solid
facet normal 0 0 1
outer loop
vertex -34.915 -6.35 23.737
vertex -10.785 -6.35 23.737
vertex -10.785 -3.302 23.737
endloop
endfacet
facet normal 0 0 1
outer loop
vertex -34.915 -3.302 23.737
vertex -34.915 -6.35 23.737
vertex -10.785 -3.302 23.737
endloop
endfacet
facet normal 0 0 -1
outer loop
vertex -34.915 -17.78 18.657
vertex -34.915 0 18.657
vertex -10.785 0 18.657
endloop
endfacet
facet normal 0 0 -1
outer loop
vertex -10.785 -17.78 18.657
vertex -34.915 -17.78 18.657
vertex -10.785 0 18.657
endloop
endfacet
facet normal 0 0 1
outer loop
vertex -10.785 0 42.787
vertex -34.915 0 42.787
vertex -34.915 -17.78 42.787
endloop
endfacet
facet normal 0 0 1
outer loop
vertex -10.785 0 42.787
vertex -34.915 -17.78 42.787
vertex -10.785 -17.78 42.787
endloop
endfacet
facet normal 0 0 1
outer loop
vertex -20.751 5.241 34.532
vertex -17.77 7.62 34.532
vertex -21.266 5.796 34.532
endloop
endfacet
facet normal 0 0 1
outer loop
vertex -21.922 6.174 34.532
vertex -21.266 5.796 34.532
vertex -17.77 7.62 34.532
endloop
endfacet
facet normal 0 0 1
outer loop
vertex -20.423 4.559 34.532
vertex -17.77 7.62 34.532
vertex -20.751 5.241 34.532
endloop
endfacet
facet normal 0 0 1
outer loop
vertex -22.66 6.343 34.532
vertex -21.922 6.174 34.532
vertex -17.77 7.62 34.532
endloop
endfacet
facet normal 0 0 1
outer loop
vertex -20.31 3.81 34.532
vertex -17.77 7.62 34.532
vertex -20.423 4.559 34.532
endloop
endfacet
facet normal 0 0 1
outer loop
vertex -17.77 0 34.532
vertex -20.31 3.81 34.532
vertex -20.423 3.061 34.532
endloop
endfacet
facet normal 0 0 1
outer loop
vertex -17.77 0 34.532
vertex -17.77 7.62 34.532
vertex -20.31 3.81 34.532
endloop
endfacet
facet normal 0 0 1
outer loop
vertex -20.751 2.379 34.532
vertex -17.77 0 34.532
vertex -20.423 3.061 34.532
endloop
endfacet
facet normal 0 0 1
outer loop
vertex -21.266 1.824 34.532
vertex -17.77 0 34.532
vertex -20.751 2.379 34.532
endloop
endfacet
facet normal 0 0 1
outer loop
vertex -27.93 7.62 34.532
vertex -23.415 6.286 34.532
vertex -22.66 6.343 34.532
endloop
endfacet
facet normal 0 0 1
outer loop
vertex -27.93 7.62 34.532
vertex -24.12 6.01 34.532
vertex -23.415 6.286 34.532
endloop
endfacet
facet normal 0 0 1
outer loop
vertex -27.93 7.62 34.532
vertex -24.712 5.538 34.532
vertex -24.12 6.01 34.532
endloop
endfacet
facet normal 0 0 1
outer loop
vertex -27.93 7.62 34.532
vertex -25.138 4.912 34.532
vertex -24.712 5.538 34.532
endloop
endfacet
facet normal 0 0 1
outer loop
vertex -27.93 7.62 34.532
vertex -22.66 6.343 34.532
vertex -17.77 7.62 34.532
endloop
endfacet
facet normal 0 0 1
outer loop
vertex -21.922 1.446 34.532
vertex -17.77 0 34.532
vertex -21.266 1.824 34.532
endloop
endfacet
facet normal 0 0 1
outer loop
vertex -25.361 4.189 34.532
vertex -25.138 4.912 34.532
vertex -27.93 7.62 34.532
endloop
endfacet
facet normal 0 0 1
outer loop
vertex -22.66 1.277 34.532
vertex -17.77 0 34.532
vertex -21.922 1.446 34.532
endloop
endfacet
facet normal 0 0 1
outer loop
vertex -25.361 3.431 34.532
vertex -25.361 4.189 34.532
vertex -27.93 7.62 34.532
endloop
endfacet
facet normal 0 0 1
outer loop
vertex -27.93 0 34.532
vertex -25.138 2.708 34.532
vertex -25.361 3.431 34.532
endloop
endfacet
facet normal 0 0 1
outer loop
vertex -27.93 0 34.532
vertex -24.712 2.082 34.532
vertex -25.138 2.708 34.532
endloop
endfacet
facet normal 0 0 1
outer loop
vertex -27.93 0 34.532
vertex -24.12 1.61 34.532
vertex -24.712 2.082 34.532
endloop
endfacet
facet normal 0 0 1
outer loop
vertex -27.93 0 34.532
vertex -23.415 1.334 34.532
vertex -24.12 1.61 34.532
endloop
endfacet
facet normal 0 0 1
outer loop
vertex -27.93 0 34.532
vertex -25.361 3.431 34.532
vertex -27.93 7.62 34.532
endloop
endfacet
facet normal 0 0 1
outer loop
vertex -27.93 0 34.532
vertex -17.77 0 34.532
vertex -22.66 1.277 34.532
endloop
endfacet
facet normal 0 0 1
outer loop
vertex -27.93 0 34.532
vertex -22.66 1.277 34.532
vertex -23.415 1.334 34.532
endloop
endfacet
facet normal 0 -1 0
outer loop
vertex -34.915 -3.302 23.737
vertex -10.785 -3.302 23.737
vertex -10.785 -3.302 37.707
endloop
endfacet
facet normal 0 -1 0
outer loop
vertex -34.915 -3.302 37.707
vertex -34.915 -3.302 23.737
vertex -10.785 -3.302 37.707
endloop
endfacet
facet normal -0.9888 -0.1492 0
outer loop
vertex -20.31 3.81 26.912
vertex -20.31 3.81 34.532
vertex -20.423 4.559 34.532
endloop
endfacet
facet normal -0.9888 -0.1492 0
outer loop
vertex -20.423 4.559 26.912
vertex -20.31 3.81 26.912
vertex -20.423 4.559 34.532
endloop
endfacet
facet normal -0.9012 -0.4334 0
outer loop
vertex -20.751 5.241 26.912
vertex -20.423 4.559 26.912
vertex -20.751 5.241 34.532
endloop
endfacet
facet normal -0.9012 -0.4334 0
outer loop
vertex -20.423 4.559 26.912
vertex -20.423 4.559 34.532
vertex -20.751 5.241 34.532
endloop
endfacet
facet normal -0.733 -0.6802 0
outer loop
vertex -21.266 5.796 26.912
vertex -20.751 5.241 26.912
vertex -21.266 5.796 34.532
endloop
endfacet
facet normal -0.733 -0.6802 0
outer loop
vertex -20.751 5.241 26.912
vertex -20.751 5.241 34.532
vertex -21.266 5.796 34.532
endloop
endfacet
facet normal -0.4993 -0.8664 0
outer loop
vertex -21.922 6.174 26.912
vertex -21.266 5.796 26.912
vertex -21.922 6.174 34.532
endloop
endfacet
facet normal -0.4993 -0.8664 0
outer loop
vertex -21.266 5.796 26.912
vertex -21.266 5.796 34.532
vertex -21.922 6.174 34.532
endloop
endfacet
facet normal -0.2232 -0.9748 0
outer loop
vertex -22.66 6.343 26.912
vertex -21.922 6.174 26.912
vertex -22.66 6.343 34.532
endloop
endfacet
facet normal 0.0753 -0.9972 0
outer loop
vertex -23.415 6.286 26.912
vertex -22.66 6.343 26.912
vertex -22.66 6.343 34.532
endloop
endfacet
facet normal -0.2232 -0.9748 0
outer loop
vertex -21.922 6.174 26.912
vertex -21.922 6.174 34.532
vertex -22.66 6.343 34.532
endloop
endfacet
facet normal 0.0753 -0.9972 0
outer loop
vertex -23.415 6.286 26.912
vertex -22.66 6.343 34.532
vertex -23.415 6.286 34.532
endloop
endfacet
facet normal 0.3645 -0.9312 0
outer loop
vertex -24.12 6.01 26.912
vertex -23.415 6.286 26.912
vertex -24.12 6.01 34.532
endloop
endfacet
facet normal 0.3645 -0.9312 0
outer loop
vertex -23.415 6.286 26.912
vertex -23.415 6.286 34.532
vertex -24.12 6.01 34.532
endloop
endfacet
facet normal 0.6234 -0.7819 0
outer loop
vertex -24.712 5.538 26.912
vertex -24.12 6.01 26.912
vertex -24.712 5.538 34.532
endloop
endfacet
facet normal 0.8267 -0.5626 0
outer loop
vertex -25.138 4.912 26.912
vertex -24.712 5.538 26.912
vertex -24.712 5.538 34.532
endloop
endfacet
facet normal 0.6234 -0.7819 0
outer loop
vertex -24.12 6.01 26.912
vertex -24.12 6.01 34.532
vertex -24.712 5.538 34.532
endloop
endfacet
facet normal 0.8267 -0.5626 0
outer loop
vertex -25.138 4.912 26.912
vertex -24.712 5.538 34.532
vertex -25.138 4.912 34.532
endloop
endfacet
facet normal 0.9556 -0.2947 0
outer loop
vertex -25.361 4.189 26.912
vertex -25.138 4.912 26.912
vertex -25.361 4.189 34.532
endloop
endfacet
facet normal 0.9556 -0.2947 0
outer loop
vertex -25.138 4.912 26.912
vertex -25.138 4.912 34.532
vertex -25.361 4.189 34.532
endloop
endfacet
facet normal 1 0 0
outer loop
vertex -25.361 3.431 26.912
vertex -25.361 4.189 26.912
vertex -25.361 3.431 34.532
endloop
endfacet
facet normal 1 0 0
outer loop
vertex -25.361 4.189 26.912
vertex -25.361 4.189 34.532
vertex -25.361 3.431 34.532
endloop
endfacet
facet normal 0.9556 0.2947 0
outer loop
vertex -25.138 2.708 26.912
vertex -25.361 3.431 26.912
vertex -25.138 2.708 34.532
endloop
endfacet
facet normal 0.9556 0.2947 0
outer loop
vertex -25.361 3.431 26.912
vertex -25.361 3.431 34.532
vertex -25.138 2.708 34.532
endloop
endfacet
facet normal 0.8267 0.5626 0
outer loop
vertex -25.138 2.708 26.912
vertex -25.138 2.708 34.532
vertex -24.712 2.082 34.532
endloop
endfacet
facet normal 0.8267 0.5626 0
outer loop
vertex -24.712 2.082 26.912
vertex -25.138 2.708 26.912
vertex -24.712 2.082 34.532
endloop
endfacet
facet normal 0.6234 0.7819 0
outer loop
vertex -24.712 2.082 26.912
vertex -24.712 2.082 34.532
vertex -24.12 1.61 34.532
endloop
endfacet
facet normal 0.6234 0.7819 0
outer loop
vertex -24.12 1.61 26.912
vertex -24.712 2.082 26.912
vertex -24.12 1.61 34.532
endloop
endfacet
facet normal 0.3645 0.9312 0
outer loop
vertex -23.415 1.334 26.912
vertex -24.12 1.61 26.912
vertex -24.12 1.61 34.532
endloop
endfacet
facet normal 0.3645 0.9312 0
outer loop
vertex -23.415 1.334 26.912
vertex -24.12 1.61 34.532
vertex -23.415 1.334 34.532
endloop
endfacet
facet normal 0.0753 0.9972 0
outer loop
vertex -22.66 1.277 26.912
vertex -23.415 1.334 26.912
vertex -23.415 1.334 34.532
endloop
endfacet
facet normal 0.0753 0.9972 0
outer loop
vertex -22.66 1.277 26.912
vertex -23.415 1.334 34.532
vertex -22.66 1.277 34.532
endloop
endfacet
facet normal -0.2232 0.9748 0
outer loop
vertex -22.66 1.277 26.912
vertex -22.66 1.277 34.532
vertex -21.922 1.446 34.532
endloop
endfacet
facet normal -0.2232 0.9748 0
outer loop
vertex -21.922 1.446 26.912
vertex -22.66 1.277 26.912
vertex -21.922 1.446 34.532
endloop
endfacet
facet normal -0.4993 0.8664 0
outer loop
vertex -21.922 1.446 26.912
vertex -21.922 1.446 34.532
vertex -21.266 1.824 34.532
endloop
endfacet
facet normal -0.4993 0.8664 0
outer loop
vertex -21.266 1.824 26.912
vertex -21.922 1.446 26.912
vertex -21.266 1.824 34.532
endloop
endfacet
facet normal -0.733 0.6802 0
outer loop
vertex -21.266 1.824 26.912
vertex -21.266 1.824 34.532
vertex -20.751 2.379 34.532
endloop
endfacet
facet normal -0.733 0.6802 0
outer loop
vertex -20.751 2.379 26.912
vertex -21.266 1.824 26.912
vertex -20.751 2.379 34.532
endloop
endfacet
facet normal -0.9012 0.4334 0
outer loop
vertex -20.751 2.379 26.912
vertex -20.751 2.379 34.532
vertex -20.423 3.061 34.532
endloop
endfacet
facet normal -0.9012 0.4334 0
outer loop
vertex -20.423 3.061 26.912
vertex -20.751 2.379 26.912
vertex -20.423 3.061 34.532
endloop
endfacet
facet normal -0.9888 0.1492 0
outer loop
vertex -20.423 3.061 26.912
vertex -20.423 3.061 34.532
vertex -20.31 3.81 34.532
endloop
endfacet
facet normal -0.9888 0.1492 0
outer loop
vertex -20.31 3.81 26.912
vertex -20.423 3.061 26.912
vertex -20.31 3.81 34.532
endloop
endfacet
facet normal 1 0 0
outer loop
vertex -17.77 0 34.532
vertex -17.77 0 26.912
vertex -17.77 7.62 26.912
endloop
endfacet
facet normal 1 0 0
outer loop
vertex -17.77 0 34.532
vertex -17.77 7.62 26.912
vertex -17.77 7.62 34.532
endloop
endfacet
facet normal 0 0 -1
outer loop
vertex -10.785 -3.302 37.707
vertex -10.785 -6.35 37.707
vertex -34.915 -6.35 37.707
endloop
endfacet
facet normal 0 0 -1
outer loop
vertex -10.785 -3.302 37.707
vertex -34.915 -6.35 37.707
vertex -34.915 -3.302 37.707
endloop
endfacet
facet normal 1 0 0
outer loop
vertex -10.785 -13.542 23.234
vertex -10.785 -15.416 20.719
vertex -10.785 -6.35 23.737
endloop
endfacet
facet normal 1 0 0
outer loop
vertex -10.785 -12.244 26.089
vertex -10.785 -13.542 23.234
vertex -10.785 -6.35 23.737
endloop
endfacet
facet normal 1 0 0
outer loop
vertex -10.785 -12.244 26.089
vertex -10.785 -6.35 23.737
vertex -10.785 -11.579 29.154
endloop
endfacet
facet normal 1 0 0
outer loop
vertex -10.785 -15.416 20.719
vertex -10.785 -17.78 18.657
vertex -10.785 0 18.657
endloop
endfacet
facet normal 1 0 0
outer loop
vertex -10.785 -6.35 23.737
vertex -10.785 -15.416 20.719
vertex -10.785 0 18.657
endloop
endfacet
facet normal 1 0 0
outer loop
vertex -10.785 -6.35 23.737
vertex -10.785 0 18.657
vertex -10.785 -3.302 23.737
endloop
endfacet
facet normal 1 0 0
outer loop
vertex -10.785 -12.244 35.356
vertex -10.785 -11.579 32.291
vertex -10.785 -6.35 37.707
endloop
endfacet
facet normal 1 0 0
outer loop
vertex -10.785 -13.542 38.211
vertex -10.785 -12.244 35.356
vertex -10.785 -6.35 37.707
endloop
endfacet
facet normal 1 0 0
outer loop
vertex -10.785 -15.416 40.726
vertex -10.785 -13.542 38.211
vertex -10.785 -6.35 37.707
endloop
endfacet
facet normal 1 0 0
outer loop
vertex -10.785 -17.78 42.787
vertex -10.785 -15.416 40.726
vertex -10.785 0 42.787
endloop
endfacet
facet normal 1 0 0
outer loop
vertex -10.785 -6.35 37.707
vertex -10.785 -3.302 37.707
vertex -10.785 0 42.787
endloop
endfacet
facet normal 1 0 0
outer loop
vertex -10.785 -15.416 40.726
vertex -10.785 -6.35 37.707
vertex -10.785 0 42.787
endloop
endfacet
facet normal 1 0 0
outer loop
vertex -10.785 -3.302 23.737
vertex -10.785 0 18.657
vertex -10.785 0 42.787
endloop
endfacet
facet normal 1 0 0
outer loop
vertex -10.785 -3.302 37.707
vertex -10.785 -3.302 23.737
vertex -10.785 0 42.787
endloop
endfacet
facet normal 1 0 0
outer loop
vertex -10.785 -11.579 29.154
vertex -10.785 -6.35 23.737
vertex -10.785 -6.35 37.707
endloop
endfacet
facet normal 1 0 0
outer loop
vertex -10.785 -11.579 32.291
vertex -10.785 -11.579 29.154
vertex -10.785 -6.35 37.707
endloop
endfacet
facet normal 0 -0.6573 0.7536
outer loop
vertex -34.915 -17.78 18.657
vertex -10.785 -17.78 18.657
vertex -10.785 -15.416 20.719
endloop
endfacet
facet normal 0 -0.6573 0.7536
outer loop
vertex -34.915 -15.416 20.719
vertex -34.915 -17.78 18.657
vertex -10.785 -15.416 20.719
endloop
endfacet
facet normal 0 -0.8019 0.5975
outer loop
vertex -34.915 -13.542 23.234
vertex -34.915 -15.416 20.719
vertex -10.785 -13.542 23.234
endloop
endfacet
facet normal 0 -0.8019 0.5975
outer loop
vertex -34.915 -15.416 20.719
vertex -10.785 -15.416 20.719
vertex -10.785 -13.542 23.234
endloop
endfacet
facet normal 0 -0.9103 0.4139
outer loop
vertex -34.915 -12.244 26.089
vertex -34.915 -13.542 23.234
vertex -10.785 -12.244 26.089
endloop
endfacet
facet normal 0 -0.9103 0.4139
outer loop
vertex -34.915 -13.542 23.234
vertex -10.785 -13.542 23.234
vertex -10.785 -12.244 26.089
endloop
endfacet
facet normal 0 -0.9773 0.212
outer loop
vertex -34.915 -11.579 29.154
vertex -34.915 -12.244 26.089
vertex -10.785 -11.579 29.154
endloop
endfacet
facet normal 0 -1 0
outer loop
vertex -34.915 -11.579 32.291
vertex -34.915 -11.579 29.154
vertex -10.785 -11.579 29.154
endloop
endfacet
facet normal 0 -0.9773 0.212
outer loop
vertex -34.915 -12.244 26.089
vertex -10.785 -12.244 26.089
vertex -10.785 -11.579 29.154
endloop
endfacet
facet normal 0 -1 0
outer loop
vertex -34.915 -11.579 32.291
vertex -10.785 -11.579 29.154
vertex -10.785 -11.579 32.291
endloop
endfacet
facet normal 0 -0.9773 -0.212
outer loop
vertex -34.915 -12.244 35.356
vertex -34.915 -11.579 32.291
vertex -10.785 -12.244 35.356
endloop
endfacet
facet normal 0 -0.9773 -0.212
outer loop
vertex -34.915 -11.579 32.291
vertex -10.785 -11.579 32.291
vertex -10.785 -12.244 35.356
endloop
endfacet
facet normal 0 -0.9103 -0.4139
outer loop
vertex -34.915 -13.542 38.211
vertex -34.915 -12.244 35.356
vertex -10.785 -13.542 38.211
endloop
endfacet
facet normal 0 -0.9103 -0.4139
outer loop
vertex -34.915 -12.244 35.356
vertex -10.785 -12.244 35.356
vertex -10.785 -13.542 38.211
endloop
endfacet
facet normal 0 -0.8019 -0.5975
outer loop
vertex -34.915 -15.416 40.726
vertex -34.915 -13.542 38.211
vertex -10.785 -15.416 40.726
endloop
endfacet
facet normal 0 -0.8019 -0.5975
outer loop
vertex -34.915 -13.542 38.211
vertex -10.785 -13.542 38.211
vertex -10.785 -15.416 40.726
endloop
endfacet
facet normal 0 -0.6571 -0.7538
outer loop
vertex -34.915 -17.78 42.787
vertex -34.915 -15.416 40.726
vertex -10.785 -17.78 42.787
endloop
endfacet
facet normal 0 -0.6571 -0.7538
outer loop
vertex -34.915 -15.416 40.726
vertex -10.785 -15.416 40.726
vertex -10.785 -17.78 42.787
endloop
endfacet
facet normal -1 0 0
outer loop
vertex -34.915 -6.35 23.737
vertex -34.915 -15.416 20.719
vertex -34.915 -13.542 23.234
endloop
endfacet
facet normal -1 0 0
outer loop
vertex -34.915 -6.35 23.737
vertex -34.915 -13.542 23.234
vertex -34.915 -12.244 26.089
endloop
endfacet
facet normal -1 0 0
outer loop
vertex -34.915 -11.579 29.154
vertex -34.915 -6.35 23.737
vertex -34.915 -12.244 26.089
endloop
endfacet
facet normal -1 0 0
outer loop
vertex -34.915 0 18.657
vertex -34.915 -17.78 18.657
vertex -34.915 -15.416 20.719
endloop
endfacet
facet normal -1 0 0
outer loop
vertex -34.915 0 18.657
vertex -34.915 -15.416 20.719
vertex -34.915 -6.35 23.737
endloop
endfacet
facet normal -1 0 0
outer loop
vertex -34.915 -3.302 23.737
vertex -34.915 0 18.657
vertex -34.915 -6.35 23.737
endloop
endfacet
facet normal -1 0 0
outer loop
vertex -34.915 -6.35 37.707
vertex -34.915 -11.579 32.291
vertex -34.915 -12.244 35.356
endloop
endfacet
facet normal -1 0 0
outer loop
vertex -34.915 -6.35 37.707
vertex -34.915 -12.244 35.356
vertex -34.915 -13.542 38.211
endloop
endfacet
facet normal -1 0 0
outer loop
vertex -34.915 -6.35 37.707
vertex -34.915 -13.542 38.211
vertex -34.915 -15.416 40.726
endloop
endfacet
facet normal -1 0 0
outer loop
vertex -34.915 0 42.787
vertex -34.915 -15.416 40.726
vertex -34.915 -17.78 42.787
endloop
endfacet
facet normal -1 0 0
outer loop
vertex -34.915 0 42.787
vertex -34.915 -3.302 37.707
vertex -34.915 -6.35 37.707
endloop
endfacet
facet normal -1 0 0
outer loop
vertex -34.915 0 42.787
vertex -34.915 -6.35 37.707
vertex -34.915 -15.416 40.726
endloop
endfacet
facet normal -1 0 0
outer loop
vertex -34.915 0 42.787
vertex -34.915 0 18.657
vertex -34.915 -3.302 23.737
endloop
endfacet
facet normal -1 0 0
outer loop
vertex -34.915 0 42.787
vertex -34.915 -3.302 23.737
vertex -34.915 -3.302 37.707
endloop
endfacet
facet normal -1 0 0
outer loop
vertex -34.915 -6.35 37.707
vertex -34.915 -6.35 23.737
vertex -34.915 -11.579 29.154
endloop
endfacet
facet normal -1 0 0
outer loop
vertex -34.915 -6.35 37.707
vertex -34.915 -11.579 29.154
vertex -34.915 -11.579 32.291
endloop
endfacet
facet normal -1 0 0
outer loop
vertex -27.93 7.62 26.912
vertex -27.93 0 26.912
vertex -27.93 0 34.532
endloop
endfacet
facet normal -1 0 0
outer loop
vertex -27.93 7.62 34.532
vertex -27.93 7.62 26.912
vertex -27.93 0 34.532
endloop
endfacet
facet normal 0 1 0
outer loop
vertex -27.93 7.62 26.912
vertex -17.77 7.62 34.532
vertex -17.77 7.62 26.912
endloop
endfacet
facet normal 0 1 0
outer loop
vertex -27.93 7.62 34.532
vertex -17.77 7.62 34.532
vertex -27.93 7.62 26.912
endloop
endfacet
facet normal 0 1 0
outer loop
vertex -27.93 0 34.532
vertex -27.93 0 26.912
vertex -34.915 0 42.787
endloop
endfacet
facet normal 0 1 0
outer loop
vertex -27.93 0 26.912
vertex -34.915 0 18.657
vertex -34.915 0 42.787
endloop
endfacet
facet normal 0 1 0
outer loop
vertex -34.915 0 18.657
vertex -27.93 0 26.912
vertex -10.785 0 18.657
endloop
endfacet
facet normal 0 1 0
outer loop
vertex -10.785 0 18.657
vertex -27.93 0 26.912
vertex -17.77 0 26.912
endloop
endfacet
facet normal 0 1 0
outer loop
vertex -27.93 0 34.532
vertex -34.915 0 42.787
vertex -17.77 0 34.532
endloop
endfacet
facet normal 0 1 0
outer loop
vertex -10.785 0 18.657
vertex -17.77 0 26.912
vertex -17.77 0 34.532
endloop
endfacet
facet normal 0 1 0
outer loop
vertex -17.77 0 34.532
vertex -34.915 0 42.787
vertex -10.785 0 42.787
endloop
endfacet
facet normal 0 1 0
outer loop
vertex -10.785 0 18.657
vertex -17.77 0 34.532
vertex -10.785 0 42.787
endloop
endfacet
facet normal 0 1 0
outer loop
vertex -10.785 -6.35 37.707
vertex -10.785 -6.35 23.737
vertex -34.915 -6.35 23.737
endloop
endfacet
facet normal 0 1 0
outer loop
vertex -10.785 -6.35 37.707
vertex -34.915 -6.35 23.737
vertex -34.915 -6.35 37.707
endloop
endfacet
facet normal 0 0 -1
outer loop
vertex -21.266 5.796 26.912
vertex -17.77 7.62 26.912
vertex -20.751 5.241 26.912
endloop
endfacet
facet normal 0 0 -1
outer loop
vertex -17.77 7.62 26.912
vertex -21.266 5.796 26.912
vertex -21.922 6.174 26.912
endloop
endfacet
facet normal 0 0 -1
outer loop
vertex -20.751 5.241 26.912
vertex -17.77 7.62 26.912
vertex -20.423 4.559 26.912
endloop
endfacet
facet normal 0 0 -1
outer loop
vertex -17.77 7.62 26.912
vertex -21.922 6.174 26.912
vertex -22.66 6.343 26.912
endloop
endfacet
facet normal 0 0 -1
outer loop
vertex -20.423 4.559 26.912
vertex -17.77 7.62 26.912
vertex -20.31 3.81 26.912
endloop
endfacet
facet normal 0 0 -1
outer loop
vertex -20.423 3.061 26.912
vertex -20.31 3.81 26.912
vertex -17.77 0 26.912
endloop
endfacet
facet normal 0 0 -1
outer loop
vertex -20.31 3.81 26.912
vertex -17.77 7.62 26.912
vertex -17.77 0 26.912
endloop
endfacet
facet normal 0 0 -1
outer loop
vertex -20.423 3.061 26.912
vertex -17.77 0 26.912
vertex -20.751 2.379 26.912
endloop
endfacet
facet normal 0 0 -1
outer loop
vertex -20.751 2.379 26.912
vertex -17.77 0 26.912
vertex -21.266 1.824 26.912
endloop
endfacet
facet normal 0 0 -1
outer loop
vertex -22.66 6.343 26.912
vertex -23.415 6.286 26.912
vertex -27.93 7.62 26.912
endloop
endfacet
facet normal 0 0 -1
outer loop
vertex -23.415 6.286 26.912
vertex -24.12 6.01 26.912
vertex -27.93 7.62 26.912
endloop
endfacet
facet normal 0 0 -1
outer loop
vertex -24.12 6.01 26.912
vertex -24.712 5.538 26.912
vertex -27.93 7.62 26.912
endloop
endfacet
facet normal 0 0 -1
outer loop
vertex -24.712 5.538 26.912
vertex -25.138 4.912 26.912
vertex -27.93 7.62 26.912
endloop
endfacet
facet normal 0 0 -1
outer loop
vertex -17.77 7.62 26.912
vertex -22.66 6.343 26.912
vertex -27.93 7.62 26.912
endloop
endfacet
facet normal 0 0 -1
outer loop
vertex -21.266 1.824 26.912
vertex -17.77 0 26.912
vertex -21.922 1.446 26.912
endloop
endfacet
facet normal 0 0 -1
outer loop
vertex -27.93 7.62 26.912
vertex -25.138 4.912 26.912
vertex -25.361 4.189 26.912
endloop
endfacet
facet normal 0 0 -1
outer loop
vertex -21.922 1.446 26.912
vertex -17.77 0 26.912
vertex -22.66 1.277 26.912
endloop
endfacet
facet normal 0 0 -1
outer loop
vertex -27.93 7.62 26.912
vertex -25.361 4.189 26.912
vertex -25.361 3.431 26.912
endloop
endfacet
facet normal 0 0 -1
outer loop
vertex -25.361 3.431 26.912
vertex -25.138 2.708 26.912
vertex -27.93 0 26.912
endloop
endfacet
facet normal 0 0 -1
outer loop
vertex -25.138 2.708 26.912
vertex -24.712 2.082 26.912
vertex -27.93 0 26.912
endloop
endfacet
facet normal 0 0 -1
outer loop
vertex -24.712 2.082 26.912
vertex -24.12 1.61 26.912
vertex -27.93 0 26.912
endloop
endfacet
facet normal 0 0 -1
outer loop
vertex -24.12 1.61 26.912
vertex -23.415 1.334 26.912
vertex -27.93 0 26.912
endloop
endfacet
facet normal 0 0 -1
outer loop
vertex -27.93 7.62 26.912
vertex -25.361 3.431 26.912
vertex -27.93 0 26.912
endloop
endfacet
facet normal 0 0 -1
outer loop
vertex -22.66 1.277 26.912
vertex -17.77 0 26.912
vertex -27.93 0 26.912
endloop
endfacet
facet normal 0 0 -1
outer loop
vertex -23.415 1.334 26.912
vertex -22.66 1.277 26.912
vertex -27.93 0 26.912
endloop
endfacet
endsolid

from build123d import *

# Parameters (mm, degrees)
F0_W     = 24.13
F0_H     = 24.13
F1_DEPTH = 17.78
F3_DEPTH = 24.131
F4_W     = 10.16
F4_H     = 7.62
F5_DEPTH = 7.62
F6_R     = 2.54
F7_DEPTH = 15.876
F8_W     = 3.048
F8_H     = 13.97
F9_DEPTH = 24.131


with BuildPart() as f1:
    # F0 (on Front) → F1 (new body)
    with BuildSketch(Plane.XZ):
        with Locations((-22.849758, 30.722394)):
            Rectangle(F0_W, F0_H)
    extrude(amount=F1_DEPTH)

    # F2 (on face) → F3 (cut, through all)
    with BuildSketch(Plane.YZ.offset(-10.784758)):
        with BuildLine():
            Line((-17.78, 42.787394), (-17.78, 18.657394))
            ThreePointArc((-17.78, 18.657394), (-11.495566, 30.722394), (-17.78, 42.787394))
        make_face()
    extrude(amount=-F3_DEPTH, mode=Mode.SUBTRACT)

    # F4 (on face) → F5 (join)
    with BuildSketch(Plane(origin=(0, 0, 0), x_dir=(-1, 0, 0), z_dir=(0, 1, 0))):
        with Locations((22.849758, 30.722394)):
            Rectangle(F4_W, F4_H)
    extrude(amount=F5_DEPTH)

    # F6 (on face) → F7 (cut, through all)
    with BuildSketch(Plane.XY.offset(34.532394)):
        with Locations((-22.849758, 3.81)):
            Circle(F6_R)
    extrude(amount=-F7_DEPTH, mode=Mode.SUBTRACT)

    # F8 (on face) → F9 (cut, through all)
    with BuildSketch(Plane.YZ.offset(-10.784758)):
        with Locations((-4.826, 30.722394)):
            Rectangle(F8_W, F8_H)
    extrude(amount=-F9_DEPTH, mode=Mode.SUBTRACT)


solid = f1.part
